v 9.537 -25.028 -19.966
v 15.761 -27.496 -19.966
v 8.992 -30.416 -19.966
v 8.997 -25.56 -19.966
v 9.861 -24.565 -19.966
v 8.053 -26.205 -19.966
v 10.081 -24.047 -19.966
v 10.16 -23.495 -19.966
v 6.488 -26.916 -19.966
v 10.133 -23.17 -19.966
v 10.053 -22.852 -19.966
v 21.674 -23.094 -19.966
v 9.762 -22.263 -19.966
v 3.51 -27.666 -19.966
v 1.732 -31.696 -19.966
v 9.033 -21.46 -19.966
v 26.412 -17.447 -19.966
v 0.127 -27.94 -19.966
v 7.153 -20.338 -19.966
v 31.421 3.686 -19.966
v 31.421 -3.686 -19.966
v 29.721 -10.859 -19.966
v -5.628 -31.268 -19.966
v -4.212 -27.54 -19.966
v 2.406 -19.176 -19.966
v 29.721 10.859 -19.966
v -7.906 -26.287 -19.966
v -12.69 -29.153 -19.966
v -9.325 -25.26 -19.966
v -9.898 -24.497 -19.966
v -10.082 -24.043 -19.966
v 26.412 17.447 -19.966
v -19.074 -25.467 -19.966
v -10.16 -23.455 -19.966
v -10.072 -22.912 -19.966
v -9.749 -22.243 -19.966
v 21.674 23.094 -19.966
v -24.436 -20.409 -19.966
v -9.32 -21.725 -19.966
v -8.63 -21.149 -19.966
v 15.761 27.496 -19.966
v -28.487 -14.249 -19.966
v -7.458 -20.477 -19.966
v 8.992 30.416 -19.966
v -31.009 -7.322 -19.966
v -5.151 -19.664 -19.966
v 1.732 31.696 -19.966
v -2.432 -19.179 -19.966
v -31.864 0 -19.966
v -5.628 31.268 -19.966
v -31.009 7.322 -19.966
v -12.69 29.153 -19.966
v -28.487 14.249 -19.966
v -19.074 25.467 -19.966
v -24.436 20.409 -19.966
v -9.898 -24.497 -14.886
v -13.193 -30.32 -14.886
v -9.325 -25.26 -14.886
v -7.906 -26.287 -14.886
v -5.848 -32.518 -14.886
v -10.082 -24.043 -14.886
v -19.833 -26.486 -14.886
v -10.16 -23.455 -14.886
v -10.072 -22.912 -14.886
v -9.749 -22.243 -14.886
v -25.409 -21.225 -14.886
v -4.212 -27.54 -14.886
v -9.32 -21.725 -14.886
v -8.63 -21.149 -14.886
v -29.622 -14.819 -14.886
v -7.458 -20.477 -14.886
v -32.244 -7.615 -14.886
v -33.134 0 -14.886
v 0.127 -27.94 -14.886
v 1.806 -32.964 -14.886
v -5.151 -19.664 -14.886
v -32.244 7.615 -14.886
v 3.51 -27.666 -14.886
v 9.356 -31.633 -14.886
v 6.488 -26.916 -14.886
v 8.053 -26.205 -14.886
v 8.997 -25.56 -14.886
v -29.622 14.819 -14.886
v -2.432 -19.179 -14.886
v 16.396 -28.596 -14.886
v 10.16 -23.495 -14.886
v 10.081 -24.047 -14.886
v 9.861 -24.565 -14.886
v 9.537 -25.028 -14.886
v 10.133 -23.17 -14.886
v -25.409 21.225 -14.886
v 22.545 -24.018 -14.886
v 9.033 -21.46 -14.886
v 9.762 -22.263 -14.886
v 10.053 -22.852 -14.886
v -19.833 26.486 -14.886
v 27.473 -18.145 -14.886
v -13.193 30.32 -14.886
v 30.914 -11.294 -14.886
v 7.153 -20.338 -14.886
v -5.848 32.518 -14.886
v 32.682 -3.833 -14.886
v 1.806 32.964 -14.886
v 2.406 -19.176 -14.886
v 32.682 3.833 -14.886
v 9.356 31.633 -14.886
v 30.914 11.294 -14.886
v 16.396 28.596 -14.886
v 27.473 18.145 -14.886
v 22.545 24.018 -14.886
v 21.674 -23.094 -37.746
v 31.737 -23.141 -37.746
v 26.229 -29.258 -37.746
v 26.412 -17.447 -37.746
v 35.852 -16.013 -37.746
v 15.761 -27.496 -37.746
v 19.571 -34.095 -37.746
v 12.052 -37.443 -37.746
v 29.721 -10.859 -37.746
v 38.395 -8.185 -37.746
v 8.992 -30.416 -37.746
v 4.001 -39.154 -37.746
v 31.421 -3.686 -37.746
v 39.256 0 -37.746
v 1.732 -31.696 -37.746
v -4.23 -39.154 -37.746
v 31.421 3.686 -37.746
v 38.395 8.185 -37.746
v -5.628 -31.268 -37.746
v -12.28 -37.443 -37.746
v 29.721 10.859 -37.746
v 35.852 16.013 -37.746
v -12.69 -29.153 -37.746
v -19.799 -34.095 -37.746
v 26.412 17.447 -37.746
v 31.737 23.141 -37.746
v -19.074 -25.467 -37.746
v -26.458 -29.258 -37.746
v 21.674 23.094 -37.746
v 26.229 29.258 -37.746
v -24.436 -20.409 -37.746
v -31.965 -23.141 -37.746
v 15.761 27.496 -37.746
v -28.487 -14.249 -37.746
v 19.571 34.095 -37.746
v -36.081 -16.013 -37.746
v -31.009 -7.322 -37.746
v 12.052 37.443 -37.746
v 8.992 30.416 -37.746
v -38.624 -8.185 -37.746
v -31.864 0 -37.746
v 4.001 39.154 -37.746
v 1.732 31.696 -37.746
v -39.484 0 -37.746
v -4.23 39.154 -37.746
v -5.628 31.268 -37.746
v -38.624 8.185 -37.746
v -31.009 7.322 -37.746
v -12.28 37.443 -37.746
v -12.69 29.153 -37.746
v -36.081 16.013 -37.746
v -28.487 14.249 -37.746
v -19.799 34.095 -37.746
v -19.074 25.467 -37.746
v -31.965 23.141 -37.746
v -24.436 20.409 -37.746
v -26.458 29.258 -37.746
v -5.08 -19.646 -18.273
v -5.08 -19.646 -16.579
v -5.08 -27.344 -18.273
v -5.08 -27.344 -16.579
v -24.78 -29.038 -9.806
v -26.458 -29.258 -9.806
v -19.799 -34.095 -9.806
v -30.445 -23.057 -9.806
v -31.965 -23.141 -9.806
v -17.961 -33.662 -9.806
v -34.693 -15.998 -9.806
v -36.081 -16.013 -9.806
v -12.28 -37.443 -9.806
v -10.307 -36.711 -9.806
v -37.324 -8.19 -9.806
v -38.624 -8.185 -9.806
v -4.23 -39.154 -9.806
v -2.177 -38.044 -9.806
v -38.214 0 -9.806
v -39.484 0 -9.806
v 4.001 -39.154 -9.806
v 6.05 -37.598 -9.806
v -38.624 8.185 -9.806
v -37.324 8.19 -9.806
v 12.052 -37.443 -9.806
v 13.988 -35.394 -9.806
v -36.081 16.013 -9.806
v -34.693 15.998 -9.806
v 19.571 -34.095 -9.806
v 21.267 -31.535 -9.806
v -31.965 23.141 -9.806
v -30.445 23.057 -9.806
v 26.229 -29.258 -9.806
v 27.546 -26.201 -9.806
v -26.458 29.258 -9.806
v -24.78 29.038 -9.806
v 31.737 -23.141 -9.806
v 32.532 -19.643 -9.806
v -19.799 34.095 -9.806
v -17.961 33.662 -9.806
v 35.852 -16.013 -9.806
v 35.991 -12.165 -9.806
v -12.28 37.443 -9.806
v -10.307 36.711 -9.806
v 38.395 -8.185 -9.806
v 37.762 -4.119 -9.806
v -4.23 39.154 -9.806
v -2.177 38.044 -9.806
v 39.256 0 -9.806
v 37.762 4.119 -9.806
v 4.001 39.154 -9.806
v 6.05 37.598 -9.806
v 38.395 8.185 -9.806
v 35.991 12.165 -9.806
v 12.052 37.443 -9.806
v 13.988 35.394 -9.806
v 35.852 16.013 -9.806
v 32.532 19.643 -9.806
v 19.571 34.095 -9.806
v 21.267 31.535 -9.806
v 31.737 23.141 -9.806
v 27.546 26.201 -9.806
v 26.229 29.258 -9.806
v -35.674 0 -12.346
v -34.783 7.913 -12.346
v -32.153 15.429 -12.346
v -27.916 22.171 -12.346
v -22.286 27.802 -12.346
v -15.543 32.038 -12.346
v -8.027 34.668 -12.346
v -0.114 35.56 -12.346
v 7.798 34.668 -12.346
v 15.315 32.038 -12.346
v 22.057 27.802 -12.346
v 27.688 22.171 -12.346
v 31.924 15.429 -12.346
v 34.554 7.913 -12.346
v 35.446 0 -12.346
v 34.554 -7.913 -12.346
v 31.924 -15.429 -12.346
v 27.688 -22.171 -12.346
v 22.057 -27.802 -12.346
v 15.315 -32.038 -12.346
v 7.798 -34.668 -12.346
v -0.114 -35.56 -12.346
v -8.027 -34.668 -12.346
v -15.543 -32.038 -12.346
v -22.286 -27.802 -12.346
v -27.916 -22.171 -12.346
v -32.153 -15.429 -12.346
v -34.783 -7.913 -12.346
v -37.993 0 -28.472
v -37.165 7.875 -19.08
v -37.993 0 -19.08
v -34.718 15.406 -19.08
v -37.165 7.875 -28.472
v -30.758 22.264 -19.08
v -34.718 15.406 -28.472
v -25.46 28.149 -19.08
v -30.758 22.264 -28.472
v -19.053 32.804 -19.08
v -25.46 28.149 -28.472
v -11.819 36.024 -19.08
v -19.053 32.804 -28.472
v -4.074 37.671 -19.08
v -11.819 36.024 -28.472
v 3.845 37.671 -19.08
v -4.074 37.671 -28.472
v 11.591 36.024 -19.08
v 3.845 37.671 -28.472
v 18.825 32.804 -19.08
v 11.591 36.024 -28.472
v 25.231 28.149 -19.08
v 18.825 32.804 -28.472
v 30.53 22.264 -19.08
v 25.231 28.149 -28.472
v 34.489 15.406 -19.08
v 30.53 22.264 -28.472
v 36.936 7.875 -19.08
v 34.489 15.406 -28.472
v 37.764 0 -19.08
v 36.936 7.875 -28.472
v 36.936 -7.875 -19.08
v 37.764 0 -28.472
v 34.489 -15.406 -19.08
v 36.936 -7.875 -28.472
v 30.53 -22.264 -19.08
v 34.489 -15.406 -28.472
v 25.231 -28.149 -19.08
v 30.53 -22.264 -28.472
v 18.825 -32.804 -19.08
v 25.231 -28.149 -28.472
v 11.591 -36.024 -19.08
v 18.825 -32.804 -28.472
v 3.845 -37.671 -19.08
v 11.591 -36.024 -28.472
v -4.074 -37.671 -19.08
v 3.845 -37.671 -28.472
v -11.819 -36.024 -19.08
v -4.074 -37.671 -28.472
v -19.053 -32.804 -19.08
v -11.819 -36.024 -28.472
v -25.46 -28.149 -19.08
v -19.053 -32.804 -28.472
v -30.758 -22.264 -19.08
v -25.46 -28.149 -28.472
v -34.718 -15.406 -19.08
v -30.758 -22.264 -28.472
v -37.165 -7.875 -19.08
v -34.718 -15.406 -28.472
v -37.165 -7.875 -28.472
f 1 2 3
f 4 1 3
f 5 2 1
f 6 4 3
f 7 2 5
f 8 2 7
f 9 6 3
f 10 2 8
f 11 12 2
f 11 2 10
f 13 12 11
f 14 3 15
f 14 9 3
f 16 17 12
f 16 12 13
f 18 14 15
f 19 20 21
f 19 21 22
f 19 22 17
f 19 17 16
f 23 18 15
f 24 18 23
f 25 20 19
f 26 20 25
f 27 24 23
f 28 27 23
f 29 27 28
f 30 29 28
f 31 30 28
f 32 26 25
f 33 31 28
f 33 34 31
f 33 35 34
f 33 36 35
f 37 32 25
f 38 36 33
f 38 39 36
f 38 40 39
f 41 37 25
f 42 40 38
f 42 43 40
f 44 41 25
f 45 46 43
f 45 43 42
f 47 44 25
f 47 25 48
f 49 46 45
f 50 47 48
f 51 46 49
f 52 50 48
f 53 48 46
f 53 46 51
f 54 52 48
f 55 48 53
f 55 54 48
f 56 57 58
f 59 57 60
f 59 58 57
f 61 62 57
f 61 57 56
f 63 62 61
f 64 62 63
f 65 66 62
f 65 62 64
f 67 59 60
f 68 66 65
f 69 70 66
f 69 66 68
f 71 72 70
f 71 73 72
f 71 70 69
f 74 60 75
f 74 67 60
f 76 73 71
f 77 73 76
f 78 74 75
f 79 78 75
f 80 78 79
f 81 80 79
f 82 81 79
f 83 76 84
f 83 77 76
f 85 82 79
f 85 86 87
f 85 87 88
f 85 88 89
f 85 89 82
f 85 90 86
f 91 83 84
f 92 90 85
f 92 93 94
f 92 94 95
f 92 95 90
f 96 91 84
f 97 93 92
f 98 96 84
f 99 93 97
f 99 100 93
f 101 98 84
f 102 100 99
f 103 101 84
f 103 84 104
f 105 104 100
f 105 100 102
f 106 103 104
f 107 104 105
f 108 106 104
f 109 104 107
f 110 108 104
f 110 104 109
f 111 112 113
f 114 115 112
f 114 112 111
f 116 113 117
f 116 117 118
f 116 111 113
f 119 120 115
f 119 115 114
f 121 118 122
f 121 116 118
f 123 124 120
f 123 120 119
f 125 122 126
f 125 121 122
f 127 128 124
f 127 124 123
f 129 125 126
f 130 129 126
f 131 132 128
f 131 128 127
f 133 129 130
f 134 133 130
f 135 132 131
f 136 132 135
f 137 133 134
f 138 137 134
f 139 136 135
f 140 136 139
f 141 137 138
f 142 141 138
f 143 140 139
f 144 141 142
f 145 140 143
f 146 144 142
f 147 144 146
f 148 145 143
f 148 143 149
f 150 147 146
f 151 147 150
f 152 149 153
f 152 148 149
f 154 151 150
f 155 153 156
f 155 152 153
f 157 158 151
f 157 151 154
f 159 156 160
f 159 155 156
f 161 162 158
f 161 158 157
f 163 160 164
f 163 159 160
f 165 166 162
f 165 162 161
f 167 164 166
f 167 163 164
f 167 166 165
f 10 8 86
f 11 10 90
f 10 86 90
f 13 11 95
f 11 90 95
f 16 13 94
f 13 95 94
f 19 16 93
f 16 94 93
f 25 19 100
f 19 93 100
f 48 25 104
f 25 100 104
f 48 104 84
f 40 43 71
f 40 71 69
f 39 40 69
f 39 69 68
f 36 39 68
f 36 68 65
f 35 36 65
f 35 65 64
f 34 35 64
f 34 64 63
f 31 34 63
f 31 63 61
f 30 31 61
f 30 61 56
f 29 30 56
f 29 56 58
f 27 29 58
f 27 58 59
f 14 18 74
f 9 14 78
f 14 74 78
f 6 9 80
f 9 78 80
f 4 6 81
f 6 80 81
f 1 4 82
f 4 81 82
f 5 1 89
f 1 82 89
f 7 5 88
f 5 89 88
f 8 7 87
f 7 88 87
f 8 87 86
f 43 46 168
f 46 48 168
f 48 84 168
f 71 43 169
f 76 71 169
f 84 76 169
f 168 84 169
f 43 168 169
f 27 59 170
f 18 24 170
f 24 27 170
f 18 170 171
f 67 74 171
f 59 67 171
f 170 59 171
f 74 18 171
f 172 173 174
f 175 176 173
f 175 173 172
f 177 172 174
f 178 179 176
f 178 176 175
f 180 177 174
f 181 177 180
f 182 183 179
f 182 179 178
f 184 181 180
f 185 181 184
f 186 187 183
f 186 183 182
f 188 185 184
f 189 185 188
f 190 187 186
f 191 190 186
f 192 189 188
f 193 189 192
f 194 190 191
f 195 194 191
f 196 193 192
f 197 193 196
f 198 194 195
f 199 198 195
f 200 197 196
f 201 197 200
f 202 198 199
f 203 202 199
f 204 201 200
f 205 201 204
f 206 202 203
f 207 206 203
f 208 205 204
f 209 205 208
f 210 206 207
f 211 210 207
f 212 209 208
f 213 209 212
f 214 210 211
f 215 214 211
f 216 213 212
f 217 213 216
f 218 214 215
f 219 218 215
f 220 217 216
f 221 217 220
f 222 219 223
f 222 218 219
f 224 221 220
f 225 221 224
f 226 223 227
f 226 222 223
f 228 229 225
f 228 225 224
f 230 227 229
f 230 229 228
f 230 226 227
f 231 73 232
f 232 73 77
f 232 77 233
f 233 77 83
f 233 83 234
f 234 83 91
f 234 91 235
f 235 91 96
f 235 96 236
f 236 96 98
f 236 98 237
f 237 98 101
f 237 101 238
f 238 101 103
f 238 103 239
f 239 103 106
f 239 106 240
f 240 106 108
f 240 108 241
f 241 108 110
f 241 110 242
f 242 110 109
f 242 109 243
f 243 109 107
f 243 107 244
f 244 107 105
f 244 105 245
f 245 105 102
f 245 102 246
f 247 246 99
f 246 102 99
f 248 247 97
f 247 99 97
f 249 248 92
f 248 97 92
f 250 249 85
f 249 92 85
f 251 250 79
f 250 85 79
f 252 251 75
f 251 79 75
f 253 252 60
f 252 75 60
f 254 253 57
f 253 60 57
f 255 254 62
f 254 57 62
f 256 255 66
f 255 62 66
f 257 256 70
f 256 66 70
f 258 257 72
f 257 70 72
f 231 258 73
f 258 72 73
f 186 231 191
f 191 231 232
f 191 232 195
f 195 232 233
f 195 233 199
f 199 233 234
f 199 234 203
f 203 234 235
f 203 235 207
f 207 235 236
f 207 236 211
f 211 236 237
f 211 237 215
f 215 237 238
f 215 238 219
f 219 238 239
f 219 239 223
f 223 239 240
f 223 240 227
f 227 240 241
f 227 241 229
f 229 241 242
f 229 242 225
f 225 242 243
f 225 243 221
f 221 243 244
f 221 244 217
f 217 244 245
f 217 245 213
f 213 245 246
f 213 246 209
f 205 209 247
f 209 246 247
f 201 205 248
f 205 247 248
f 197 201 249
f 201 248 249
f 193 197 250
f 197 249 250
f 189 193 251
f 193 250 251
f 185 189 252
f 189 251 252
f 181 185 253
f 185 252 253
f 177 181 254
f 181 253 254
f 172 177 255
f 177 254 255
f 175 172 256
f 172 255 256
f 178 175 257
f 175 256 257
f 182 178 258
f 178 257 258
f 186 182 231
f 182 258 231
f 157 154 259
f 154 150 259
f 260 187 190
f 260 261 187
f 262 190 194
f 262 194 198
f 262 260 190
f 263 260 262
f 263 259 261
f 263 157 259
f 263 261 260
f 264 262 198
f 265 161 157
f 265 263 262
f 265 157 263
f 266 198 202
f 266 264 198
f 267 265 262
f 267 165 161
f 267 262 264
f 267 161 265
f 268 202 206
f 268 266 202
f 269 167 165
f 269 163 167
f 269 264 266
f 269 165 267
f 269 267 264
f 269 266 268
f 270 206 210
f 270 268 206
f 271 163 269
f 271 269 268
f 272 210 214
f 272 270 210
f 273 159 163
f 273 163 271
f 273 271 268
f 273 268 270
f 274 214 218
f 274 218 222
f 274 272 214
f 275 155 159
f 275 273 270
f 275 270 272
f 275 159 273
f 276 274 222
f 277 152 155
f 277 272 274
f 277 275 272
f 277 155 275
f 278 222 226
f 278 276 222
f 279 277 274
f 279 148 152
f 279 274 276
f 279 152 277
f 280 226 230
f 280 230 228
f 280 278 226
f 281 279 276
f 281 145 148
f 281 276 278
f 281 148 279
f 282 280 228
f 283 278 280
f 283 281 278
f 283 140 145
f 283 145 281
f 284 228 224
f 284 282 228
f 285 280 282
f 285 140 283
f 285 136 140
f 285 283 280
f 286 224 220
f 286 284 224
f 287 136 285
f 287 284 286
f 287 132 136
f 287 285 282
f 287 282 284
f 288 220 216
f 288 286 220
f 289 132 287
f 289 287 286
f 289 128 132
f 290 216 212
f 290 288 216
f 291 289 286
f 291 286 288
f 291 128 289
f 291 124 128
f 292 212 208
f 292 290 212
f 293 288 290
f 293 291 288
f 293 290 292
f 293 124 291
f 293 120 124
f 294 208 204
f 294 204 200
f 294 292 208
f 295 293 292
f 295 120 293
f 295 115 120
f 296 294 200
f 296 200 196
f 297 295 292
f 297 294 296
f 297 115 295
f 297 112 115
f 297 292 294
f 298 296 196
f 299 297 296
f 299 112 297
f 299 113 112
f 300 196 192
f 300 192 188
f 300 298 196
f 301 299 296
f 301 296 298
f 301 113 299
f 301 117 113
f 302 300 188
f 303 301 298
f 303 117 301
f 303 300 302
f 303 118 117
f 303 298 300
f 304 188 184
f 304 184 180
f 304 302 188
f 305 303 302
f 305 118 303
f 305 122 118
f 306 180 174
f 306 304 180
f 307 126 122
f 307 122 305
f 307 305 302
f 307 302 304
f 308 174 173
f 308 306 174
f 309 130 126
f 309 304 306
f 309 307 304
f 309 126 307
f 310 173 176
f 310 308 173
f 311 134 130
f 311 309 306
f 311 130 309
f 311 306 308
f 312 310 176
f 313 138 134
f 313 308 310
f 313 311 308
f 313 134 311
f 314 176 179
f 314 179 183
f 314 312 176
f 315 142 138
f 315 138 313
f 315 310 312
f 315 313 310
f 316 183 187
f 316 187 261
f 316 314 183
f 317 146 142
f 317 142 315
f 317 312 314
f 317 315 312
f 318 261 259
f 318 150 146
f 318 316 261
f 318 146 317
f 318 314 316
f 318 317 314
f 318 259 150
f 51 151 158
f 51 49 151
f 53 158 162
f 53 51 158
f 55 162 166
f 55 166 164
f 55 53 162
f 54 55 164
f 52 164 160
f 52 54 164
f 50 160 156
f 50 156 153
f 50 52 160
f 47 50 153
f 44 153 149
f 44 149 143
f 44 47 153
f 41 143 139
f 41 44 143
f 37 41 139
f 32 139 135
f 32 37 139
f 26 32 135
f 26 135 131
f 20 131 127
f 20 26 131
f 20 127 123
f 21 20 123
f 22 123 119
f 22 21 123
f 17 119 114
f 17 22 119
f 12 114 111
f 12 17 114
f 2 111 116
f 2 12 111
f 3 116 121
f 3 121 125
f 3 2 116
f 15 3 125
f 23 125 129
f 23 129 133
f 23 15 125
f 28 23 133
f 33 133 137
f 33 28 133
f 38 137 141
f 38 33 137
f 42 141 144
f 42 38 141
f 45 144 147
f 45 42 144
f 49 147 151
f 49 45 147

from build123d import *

# Parameters (mm, degrees)
F3_DEPTH = 65.786
F4_SIZE  = 2.53999


# Not quite as in the source:
# - a fillet or chamfer is up to 0.001 mm smaller than in the source, because OpenCascade refuses the exact size


with BuildPart() as f1:
    # F0 (on Front) → F1 (revolve)
    with BuildSketch(Plane.XZ):
        with BuildLine():
            Line((-39.4843606797, -37.7460680902), (-31.8643606797, -37.7460680902))
            Line((-31.8643606797, -37.7460680902), (-31.8643606797, -19.9660680902))
            Line((-31.8643606797, -19.9660680902), (-0.1143606797, -19.9660680902))
            Line((-0.1143606797, -19.9660680902), (-0.1143606797, -14.8860680902))
            Line((-0.1143606797, -14.8860680902), (-35.6743606797, -14.8860680902))
            Line((-35.6743606797, -14.8860680902), (-35.6743606797, -9.8060680902))
            Line((-35.6743606797, -9.8060680902), (-39.4843606797, -9.8060680902))
            ThreePointArc((-39.4843606797, -9.8060680902), (-37.8052347612, -23.7760680902), (-39.4843606797, -37.7460680902))
        make_face()
    revolve(axis=Axis((-0.1143606797, 0, -17.4260680902), (0, 0, -1)))

    # F2 (on Top) → F3 (cut)
    with BuildSketch(Plane.XY):
        with BuildLine():
            add(Edge.make_bspline(
                [(10.16, -23.495), (10.16, -15.7960341604), (-5.08, -19.6455170802), (-20.32, -23.495), (-5.08, -27.3444829198), (10.16, -31.1939658396), (10.16, -23.495)],
                knots=[0, 0, 0, 2.0943951024, 2.0943951024, 4.1887902048, 4.1887902048, 6.2831853072, 6.2831853072, 6.2831853072], degree=2, weights=[1, 0.5, 1, 0.5, 1, 0.5, 1]))
        make_face()
    extrude(amount=-F3_DEPTH, mode=Mode.SUBTRACT)

    # F4 (size 2.54 in the source; OpenCascade refuses exactly that, so slightly less here)
    f4_edges = [f1.edges().sort_by_distance(p)[0] for p in [
        (35.445639, 0, -14.886068),
        (35.445639, 0, -9.806068),
        (-35.674361, 0, -12.346068),
    ]]
    chamfer(f4_edges, length=F4_SIZE)


solid = f1.part
